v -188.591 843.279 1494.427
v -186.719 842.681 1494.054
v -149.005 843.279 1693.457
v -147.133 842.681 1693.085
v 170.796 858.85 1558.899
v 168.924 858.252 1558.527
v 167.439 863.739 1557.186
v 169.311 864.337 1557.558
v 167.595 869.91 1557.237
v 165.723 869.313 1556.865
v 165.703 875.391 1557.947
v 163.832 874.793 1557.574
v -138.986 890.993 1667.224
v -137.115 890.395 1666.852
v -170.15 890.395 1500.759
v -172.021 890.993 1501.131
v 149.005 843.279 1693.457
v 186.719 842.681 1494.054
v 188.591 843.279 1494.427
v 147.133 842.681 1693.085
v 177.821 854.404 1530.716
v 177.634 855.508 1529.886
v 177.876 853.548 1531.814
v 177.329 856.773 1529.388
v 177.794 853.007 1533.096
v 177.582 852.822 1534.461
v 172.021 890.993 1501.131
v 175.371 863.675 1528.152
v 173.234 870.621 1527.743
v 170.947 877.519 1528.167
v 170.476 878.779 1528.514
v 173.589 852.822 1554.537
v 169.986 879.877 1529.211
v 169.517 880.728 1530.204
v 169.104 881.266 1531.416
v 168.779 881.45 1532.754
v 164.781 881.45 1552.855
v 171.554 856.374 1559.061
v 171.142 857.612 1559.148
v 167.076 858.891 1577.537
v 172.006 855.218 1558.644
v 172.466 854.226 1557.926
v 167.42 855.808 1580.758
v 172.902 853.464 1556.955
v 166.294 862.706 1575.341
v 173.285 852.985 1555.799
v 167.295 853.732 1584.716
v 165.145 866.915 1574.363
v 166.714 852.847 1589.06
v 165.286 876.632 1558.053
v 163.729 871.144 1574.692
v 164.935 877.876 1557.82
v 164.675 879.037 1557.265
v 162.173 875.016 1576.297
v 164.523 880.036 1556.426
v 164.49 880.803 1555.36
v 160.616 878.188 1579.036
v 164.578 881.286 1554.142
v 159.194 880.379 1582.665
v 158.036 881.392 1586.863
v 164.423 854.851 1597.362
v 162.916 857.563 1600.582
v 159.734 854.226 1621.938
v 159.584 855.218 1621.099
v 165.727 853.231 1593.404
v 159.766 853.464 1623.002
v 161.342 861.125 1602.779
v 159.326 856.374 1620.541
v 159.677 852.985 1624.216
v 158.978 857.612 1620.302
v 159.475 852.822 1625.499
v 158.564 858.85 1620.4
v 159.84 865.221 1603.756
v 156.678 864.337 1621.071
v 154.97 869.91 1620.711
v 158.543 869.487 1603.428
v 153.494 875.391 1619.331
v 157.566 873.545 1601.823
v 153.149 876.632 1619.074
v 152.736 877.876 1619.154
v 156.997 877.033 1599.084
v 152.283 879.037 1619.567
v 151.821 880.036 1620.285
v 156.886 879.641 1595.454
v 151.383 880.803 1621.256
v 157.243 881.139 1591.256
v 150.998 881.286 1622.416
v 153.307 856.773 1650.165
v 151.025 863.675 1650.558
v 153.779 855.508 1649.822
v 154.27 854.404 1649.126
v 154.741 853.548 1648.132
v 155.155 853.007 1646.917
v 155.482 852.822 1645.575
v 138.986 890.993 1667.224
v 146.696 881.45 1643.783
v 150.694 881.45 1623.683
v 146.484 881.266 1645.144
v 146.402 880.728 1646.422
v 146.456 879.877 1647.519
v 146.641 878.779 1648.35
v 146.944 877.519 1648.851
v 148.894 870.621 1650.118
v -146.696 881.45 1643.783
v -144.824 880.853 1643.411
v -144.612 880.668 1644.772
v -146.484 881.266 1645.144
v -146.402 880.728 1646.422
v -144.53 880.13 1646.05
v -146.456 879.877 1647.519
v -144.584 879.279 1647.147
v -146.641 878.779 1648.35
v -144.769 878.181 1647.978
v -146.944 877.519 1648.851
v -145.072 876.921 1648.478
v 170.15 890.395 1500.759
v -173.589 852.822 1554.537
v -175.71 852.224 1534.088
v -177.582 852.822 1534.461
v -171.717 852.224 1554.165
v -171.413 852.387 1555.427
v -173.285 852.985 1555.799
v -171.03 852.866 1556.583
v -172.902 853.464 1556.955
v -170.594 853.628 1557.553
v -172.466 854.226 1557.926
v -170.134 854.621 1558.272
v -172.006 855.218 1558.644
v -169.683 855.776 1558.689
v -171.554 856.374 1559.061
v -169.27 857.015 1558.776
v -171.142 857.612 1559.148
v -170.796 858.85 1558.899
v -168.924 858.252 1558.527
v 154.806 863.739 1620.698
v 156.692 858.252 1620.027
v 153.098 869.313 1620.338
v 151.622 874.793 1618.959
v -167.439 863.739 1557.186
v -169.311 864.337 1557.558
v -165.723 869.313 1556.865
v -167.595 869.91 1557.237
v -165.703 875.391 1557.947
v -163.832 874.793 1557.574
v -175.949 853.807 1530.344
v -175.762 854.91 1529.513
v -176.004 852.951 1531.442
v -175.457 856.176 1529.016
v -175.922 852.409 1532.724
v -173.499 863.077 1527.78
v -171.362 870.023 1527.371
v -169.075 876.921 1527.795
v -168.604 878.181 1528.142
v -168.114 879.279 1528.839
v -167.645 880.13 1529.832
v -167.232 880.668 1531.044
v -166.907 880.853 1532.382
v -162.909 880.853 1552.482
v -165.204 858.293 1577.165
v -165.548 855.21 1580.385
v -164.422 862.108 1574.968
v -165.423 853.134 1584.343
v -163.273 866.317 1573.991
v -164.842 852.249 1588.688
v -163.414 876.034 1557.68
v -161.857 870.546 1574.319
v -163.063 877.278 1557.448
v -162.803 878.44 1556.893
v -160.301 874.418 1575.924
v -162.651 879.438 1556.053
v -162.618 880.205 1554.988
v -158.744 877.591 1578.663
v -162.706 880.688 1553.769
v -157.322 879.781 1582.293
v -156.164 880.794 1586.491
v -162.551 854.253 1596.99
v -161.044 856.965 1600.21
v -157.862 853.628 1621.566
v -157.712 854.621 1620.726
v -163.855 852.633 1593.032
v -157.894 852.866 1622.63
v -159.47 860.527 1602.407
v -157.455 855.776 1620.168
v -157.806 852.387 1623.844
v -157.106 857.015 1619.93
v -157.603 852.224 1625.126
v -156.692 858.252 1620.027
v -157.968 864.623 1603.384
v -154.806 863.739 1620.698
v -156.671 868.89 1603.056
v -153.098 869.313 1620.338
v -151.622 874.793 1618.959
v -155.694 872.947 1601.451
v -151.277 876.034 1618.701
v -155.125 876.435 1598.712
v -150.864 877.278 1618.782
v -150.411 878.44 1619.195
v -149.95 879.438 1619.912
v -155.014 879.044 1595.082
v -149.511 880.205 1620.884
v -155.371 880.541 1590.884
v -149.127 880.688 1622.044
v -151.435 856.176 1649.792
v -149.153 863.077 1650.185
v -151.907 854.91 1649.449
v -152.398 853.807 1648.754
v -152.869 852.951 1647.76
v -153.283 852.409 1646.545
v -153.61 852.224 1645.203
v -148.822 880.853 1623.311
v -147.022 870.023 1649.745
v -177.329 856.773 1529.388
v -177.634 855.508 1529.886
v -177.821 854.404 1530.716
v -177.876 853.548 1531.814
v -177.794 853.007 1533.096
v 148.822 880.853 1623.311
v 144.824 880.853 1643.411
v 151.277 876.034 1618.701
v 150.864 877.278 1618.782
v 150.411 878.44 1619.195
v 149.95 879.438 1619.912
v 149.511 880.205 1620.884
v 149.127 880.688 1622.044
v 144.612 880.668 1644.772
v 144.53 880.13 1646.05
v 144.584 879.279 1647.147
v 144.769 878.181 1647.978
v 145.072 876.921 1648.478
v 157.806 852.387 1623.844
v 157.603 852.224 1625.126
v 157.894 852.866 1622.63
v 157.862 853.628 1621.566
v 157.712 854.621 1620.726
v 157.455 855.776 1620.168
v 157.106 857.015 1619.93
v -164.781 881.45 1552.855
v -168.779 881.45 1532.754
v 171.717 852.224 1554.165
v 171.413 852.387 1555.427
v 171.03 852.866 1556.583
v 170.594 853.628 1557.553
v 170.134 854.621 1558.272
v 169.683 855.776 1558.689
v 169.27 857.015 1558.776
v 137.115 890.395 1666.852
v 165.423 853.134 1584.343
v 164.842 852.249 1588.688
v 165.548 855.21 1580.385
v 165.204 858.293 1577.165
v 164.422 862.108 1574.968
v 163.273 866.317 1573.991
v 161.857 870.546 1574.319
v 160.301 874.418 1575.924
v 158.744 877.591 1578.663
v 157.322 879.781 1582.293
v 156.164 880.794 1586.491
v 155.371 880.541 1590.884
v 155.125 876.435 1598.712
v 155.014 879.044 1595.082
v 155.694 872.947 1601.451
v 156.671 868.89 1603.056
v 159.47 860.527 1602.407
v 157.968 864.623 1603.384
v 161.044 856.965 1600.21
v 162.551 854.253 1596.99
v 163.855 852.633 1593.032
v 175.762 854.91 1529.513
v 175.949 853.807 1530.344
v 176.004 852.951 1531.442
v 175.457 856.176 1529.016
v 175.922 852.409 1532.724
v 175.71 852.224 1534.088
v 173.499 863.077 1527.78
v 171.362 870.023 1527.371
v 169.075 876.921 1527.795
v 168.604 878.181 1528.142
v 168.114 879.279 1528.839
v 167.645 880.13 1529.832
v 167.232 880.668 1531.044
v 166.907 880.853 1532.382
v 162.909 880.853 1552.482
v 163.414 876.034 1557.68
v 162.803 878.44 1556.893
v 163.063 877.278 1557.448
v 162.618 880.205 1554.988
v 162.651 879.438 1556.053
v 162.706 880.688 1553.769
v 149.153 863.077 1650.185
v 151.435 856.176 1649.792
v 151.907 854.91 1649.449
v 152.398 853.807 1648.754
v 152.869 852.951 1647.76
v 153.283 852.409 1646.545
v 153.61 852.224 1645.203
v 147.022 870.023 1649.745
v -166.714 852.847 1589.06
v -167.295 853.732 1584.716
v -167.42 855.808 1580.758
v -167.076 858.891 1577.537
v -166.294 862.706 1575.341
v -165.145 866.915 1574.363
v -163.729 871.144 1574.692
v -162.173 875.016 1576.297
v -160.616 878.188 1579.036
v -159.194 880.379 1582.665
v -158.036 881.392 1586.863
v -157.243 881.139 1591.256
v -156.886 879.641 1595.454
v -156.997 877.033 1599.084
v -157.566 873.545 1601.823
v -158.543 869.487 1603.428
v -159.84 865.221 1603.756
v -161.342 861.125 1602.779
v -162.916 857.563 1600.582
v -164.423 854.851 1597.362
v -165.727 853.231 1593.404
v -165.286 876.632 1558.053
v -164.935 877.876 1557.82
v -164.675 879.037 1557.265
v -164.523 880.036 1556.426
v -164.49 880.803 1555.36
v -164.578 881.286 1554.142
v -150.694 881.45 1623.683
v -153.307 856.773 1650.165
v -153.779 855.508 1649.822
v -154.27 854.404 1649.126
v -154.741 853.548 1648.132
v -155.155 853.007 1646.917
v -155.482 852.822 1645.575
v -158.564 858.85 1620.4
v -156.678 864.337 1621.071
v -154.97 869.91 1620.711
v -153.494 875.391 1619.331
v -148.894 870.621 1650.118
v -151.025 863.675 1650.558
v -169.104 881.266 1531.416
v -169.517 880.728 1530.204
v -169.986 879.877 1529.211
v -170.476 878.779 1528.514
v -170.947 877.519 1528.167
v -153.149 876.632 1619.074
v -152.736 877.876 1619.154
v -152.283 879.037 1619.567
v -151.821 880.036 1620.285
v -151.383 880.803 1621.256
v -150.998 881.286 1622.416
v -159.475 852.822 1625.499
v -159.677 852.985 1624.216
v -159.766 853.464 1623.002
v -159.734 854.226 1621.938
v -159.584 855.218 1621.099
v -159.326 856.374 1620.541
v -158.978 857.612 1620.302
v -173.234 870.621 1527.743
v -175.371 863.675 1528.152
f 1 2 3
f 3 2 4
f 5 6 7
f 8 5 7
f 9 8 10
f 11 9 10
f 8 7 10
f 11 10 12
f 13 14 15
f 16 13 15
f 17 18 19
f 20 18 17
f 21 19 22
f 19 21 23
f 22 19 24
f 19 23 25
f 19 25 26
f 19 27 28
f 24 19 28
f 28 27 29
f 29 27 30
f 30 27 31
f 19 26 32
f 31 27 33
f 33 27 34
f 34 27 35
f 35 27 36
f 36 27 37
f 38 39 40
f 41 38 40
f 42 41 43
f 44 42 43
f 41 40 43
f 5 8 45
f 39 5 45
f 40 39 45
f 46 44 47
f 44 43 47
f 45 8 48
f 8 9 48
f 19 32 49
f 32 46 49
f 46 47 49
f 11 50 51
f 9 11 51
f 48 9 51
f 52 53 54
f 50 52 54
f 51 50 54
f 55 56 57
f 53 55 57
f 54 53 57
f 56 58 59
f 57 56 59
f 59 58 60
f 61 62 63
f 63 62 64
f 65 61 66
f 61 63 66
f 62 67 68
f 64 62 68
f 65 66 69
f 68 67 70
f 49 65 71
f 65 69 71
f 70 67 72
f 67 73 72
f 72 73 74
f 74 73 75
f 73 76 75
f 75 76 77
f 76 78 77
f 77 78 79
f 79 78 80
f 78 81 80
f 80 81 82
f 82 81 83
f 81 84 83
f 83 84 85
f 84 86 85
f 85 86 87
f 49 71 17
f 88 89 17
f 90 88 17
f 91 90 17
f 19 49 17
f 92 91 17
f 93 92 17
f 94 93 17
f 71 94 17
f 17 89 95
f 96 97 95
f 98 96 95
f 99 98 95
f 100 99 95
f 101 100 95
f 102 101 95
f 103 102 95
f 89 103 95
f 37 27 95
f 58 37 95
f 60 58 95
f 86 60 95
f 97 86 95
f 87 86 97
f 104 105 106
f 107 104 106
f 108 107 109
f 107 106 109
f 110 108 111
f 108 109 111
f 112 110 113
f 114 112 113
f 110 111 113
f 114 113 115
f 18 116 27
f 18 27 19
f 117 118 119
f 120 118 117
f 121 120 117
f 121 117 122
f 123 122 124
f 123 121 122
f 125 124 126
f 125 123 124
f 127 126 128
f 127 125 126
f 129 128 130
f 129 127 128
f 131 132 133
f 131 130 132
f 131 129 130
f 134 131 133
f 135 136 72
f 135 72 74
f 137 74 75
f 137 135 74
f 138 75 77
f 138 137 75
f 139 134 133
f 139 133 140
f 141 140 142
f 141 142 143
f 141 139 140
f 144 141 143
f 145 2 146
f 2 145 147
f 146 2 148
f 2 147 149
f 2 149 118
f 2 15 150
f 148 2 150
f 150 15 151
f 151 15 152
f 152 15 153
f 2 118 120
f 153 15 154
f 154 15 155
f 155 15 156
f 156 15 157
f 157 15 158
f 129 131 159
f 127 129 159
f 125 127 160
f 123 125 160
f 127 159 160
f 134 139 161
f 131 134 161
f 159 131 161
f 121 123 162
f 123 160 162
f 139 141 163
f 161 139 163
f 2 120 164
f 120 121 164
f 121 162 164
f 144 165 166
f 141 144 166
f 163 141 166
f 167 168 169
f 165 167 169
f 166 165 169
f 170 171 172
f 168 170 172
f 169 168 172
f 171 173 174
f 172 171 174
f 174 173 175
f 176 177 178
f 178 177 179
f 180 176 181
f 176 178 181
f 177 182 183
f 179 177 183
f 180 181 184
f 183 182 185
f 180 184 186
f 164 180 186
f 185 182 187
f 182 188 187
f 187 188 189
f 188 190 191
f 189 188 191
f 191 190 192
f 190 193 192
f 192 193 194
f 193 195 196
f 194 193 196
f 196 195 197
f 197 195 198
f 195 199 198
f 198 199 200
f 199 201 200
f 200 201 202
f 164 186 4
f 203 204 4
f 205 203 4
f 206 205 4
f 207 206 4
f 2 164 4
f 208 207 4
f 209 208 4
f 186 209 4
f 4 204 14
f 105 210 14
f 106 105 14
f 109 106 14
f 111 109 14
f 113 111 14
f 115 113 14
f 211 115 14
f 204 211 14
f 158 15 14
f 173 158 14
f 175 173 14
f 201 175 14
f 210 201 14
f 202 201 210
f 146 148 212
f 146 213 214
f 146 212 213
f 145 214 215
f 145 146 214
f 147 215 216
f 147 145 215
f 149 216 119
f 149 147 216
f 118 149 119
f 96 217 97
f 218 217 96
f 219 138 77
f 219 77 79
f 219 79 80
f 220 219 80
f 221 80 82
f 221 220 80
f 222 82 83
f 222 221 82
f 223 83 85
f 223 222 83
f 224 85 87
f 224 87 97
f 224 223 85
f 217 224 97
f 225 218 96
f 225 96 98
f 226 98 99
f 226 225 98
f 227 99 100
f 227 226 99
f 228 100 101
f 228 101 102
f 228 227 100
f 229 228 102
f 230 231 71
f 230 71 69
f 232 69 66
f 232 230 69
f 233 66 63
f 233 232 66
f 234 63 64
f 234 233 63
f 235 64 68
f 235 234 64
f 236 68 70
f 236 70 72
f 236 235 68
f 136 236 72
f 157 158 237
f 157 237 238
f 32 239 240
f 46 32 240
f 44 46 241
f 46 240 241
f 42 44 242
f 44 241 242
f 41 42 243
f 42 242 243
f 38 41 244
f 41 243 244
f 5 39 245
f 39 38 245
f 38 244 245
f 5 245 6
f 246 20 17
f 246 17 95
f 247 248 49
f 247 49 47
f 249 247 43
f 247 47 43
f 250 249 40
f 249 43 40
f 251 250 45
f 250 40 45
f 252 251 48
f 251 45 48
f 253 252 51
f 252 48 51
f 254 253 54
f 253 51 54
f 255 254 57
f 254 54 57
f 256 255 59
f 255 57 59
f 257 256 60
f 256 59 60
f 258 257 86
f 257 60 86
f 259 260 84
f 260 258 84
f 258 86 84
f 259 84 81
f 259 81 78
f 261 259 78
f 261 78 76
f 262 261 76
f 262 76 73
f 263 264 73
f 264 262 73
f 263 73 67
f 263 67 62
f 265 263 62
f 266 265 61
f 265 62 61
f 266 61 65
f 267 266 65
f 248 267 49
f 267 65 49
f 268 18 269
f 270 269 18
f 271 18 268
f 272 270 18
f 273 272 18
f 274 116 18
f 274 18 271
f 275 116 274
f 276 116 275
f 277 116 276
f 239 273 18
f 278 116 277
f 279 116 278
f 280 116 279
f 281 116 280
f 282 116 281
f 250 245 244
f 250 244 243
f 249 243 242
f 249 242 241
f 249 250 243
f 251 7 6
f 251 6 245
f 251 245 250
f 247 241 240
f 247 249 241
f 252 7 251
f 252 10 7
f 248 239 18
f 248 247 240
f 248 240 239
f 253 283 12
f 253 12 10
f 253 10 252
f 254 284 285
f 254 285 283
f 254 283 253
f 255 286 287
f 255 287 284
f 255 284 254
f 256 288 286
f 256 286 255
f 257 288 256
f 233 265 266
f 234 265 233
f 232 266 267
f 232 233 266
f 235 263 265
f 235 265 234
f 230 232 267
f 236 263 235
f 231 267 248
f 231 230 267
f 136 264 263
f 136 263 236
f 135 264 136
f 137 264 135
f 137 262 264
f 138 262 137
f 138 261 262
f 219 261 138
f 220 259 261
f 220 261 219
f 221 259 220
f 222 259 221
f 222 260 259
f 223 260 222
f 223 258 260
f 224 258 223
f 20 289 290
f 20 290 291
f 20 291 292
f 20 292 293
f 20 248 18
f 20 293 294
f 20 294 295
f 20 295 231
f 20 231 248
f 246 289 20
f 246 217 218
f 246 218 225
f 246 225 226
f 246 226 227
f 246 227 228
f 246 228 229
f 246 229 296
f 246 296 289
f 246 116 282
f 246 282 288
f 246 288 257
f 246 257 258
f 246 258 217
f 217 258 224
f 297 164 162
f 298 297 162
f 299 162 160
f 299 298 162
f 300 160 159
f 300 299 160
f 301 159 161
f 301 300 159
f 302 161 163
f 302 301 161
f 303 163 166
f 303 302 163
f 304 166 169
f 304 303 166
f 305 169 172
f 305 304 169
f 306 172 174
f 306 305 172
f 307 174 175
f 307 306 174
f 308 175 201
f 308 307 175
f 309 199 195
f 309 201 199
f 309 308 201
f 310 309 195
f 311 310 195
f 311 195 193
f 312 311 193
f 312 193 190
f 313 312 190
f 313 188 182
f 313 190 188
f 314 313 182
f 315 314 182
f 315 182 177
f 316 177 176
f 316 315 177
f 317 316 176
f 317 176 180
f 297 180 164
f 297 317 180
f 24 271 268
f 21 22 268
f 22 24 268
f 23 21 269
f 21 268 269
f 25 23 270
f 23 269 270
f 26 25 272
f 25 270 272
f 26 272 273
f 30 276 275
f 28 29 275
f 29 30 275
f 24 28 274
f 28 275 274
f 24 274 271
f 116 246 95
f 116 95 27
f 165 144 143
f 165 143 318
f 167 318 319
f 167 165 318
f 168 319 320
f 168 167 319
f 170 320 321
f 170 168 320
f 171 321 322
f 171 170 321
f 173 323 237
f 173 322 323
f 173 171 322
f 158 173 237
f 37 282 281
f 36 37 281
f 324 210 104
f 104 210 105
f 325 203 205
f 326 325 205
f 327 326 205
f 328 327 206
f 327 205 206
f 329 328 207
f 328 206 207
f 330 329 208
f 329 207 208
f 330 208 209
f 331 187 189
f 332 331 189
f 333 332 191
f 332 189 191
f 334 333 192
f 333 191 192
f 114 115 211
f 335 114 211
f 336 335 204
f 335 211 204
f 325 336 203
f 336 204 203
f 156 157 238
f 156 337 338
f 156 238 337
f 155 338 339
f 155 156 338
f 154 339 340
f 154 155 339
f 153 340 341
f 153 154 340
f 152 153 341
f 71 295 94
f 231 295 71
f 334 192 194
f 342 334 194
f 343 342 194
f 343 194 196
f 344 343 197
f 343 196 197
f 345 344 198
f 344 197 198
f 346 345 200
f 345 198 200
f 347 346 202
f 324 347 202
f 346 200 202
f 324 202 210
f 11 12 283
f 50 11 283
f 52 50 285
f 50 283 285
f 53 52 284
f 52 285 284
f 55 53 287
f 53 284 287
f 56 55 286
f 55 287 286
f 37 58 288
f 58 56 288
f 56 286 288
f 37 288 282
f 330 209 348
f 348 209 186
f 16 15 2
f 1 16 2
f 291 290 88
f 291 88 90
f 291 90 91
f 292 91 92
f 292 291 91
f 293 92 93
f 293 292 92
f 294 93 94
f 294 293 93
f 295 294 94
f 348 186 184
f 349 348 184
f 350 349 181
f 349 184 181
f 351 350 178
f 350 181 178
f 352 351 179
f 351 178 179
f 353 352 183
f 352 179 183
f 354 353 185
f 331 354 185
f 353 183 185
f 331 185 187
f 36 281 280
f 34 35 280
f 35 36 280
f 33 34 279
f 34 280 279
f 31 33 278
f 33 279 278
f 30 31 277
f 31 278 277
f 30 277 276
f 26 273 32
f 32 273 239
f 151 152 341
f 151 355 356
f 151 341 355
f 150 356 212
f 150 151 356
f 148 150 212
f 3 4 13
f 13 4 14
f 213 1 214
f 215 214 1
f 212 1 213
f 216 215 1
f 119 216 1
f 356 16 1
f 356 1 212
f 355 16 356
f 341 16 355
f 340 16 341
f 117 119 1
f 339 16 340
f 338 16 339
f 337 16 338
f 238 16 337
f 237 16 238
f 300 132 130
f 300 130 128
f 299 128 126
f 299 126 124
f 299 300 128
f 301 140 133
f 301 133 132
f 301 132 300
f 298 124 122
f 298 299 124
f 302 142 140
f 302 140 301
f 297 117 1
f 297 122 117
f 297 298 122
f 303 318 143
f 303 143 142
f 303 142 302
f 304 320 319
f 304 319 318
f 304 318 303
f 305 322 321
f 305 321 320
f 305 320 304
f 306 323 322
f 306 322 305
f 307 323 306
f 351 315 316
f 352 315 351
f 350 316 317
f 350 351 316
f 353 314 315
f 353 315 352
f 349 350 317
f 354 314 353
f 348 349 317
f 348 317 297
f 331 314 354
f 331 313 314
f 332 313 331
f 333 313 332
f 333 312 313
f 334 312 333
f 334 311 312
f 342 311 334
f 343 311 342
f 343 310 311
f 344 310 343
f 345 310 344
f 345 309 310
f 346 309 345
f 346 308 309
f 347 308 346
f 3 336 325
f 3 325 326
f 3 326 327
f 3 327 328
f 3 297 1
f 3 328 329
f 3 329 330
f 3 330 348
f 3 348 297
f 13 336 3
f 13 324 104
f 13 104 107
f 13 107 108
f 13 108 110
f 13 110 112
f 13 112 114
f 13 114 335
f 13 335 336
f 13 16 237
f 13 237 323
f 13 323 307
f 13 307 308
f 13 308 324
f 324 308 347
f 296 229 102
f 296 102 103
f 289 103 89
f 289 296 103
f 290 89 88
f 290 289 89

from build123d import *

# Parameters (mm, degrees)
BOSS_EXTRUDE1_DEPTH     = 2
CUT_EXTRUDE4_DEPTH      = 1783.373892428
CUT_EXTRUDE4_DEPTH_BACK = 1783.373892428
SKETCH3_R               = 15
CUT_EXTRUDE5_DEPTH      = 1783.287445841
CUT_EXTRUDE5_DEPTH_BACK = 1783.287445841


with BuildPart() as part:
    # Sketch1 → Boss-Extrude1 (new body)
    with BuildSketch(Plane(origin=(-659.614198676, 210.630673215, 131.193827815), x_dir=(-0.17733557040624176, 0.056627511437048535, -0.9825199338523061), z_dir=(0.9359591821601224, -0.2988742708017783, -0.1861574053935545))):
        Polygon((-1393.93126095, 796.442353721), (-1387.107384854, 745.948447334), (-1589.678471357, 757.99020856), (-1562.978977596, 806.49133097), align=None)
    extrude(amount=-BOSS_EXTRUDE1_DEPTH)

    # Sketch3 → Cut-Extrude4 (cut, two sides: drawn at the far end of the back side and taken through both)
    with BuildSketch(Plane(origin=(-647.727517063, 206.834969975, 128.829628767), x_dir=(-0.17733557040624176, 0.056627511437048535, -0.9825199338523061), z_dir=(0.9359591821601224, -0.2988742708017783, -0.1861574053935545)).offset(-CUT_EXTRUDE4_DEPTH_BACK)):
        with Locations(Location((-1483.424023689, 776.718085146, 0), (0, 0, 270))):
            Circle(SKETCH3_R)
    extrude(amount=CUT_EXTRUDE4_DEPTH + CUT_EXTRUDE4_DEPTH_BACK, mode=Mode.SUBTRACT)

    # Sketch6 → Cut-Extrude5 (cut, two sides: drawn at the far end of the back side and taken through both)
    with BuildSketch(Plane(origin=(-661.48611704, 211.228421756, 131.566142626), x_dir=(0.17733557040624248, -0.05662751143704847, 0.982519933852306), z_dir=(-0.9359591821601227, 0.298874270801777, 0.1861574053935552)).offset(-CUT_EXTRUDE5_DEPTH_BACK)):
        with BuildLine():
            Line((1446.574766594, 789.554074167), (1426.116791028, 788.337957587))
            ThreePointArc((1426.116791028, 788.337957587), (1422.982372867, 786.983722163), (1421.448026269, 783.933425242))
            ThreePointArc((1421.448026269, 783.933425242), (1421.118544819, 773.027161308), (1422.690830395, 762.229797319))
            ThreePointArc((1422.690830395, 762.229797319), (1424.572057657, 759.368085016), (1427.853569511, 758.388241524))
            Line((1427.853569511, 758.388241524), (1448.286940124, 759.602895472))
            ThreePointArc((1448.286940124, 759.602895472), (1452.137251214, 761.800824117), (1452.727052349, 766.194902))
            ThreePointArc((1452.727052349, 766.194902), (1451.067215368, 774.782216154), (1451.757447486, 783.501195612))
            ThreePointArc((1451.757447486, 783.501195612), (1450.66945389, 787.814851695), (1446.574766594, 789.554074167))
        make_face()
        with BuildLine():
            Line((1518.663078212, 793.839336445), (1539.121053778, 795.055453025))
            ThreePointArc((1539.121053778, 795.055453025), (1542.393835076, 794.082091137), (1544.27874665, 791.235050718))
            ThreePointArc((1544.27874665, 791.235050718), (1545.897979428, 780.44462736), (1545.615936818, 769.537033538))
            ThreePointArc((1545.615936818, 769.537033538), (1544.086986772, 766.472604542), (1540.94466742, 765.110898845))
            Line((1540.94466742, 765.110898845), (1520.511296807, 763.896244898))
            ThreePointArc((1520.511296807, 763.896244898), (1516.427711366, 765.622546079), (1515.321494808, 769.915804836))
            ThreePointArc((1515.321494808, 769.915804836), (1515.952298188, 778.639285235), (1514.233984221, 787.215089587))
            ThreePointArc((1514.233984221, 787.215089587), (1514.803274243, 791.627262264), (1518.663078212, 793.839336445))
        make_face()
    extrude(amount=CUT_EXTRUDE5_DEPTH + CUT_EXTRUDE5_DEPTH_BACK, mode=Mode.SUBTRACT)


with BuildPart() as body_2:
    # Mirror5: mirrored copy
    add(part.part.mirror(Plane(origin=(0, 0, 0), x_dir=(0, 0, 1), z_dir=(1, 0, 0))))


solid = Compound([part.part, body_2.part])
